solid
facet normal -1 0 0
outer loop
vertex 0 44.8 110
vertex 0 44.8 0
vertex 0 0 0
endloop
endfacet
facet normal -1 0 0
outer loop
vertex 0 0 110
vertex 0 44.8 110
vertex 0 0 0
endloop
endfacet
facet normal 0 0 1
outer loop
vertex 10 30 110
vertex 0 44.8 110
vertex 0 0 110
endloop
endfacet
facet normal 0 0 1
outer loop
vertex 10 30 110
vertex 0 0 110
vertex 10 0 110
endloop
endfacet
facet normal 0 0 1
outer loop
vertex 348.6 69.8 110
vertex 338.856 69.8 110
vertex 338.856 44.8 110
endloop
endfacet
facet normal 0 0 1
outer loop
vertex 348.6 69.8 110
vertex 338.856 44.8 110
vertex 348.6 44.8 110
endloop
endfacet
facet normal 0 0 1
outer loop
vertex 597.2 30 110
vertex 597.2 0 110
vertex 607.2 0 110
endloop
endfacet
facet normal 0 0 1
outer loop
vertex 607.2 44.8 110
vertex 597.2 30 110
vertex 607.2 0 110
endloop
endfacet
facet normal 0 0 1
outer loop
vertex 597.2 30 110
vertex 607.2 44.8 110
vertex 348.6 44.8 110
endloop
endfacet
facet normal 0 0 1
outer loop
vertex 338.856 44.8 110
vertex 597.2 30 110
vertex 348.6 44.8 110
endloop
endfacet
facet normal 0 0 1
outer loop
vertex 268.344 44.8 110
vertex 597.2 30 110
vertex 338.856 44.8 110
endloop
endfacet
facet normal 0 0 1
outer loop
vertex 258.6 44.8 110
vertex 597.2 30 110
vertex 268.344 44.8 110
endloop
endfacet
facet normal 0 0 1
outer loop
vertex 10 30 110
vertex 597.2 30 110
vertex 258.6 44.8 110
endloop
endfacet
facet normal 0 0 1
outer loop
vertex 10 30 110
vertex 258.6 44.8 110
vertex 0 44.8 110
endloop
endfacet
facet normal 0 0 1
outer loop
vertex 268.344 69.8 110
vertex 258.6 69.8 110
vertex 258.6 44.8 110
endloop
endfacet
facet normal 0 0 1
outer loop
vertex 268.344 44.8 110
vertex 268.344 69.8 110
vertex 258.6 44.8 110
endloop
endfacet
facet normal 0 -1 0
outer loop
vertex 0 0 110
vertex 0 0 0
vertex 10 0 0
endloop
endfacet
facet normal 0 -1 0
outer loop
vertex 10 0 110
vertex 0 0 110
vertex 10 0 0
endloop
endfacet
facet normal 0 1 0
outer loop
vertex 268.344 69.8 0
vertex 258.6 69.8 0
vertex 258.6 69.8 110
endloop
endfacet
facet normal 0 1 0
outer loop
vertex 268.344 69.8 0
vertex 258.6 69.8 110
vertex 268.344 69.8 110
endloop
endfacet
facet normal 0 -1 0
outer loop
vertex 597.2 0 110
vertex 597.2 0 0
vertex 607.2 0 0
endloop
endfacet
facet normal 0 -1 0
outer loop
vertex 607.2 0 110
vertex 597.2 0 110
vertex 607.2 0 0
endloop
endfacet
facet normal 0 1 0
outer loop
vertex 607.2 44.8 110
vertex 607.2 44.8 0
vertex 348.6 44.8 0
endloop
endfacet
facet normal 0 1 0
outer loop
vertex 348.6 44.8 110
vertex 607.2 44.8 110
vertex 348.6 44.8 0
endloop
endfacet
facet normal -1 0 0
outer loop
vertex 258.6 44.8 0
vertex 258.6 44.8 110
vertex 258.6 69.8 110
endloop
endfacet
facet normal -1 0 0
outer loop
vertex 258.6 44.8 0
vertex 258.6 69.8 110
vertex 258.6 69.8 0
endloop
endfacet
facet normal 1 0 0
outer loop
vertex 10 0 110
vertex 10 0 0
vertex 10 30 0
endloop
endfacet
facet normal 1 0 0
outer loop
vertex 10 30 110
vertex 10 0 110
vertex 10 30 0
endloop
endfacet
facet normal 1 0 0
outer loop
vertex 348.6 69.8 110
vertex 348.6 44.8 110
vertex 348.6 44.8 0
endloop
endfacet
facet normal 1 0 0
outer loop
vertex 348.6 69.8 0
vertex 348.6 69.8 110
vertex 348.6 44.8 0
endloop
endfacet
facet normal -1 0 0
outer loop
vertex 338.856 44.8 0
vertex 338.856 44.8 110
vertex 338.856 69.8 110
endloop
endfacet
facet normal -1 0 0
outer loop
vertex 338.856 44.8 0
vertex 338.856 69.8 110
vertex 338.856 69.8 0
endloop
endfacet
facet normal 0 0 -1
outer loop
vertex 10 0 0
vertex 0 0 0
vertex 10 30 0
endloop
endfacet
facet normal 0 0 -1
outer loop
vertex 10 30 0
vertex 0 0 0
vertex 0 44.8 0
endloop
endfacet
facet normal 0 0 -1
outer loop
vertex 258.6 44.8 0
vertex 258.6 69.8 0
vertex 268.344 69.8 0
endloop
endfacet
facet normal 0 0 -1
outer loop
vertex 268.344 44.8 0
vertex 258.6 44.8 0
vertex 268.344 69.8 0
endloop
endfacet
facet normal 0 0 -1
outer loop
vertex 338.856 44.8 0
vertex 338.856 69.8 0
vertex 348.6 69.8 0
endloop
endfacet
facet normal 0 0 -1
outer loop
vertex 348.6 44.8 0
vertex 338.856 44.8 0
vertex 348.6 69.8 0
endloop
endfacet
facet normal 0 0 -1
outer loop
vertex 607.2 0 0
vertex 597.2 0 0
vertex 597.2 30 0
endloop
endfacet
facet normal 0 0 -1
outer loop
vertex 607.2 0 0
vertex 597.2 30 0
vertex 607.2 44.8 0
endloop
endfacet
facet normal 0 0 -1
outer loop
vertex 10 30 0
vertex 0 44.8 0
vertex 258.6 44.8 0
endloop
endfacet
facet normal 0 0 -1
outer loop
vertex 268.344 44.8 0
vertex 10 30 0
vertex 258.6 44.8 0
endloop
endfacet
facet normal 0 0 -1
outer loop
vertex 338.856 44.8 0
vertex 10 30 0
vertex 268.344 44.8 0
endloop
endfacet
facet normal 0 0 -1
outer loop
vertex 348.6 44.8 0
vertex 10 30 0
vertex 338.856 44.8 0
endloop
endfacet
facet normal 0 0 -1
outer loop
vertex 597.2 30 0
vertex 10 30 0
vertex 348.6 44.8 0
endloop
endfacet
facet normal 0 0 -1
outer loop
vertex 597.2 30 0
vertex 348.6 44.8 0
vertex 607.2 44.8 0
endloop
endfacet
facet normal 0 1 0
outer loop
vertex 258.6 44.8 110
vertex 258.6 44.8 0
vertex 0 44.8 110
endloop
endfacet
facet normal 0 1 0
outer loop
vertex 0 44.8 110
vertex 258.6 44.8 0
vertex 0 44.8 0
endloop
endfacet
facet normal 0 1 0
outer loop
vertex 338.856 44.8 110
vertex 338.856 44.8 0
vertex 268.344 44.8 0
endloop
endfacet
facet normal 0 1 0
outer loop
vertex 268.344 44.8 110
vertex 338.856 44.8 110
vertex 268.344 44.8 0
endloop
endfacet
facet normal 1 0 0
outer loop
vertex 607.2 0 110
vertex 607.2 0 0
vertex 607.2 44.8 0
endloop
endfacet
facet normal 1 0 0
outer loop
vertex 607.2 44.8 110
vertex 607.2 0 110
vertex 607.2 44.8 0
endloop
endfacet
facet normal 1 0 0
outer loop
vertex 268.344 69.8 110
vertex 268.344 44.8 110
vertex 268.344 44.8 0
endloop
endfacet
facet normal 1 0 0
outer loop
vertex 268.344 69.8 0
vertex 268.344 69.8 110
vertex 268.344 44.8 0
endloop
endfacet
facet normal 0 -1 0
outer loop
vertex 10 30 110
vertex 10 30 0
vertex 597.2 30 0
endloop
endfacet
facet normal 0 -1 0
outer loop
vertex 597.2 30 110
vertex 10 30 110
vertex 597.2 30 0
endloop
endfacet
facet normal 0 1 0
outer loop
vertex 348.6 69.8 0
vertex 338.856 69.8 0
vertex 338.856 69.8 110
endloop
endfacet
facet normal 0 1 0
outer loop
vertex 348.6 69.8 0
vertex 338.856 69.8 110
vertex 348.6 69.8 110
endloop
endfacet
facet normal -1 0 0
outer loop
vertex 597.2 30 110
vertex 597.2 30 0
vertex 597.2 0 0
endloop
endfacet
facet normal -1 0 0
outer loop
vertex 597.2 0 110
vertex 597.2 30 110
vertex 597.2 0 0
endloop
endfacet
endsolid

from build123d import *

# Parameters (mm, degrees)
BOSS_EXTRUDE2_DEPTH = 110
SKETCH3_W           = 9.744334313
SKETCH3_H           = 110
BOSS_EXTRUDE3_DEPTH = 30.2


with BuildPart() as part:
    # Sketch1 → Boss-Extrude2 (new body)
    with BuildSketch(Plane.XY):
        Polygon((0, 0), (10, 0), (10, 30), (597.2, 30), (597.2, 0), (607.2, 0), (607.2, 44.8), (0, 44.8), align=None)
    extrude(amount=BOSS_EXTRUDE2_DEPTH)

    # Sketch3 → Boss-Extrude3 (add)
    with BuildSketch(Plane(origin=(0, 39.6, 0), x_dir=(1, 0, 0), z_dir=(0, 1, 0))):
        with Locations((343.727832843, -55)):
            Rectangle(SKETCH3_W, SKETCH3_H)
        with Locations((263.472167157, -55)):
            Rectangle(SKETCH3_W, SKETCH3_H)
    extrude(amount=BOSS_EXTRUDE3_DEPTH)


solid = part.part
